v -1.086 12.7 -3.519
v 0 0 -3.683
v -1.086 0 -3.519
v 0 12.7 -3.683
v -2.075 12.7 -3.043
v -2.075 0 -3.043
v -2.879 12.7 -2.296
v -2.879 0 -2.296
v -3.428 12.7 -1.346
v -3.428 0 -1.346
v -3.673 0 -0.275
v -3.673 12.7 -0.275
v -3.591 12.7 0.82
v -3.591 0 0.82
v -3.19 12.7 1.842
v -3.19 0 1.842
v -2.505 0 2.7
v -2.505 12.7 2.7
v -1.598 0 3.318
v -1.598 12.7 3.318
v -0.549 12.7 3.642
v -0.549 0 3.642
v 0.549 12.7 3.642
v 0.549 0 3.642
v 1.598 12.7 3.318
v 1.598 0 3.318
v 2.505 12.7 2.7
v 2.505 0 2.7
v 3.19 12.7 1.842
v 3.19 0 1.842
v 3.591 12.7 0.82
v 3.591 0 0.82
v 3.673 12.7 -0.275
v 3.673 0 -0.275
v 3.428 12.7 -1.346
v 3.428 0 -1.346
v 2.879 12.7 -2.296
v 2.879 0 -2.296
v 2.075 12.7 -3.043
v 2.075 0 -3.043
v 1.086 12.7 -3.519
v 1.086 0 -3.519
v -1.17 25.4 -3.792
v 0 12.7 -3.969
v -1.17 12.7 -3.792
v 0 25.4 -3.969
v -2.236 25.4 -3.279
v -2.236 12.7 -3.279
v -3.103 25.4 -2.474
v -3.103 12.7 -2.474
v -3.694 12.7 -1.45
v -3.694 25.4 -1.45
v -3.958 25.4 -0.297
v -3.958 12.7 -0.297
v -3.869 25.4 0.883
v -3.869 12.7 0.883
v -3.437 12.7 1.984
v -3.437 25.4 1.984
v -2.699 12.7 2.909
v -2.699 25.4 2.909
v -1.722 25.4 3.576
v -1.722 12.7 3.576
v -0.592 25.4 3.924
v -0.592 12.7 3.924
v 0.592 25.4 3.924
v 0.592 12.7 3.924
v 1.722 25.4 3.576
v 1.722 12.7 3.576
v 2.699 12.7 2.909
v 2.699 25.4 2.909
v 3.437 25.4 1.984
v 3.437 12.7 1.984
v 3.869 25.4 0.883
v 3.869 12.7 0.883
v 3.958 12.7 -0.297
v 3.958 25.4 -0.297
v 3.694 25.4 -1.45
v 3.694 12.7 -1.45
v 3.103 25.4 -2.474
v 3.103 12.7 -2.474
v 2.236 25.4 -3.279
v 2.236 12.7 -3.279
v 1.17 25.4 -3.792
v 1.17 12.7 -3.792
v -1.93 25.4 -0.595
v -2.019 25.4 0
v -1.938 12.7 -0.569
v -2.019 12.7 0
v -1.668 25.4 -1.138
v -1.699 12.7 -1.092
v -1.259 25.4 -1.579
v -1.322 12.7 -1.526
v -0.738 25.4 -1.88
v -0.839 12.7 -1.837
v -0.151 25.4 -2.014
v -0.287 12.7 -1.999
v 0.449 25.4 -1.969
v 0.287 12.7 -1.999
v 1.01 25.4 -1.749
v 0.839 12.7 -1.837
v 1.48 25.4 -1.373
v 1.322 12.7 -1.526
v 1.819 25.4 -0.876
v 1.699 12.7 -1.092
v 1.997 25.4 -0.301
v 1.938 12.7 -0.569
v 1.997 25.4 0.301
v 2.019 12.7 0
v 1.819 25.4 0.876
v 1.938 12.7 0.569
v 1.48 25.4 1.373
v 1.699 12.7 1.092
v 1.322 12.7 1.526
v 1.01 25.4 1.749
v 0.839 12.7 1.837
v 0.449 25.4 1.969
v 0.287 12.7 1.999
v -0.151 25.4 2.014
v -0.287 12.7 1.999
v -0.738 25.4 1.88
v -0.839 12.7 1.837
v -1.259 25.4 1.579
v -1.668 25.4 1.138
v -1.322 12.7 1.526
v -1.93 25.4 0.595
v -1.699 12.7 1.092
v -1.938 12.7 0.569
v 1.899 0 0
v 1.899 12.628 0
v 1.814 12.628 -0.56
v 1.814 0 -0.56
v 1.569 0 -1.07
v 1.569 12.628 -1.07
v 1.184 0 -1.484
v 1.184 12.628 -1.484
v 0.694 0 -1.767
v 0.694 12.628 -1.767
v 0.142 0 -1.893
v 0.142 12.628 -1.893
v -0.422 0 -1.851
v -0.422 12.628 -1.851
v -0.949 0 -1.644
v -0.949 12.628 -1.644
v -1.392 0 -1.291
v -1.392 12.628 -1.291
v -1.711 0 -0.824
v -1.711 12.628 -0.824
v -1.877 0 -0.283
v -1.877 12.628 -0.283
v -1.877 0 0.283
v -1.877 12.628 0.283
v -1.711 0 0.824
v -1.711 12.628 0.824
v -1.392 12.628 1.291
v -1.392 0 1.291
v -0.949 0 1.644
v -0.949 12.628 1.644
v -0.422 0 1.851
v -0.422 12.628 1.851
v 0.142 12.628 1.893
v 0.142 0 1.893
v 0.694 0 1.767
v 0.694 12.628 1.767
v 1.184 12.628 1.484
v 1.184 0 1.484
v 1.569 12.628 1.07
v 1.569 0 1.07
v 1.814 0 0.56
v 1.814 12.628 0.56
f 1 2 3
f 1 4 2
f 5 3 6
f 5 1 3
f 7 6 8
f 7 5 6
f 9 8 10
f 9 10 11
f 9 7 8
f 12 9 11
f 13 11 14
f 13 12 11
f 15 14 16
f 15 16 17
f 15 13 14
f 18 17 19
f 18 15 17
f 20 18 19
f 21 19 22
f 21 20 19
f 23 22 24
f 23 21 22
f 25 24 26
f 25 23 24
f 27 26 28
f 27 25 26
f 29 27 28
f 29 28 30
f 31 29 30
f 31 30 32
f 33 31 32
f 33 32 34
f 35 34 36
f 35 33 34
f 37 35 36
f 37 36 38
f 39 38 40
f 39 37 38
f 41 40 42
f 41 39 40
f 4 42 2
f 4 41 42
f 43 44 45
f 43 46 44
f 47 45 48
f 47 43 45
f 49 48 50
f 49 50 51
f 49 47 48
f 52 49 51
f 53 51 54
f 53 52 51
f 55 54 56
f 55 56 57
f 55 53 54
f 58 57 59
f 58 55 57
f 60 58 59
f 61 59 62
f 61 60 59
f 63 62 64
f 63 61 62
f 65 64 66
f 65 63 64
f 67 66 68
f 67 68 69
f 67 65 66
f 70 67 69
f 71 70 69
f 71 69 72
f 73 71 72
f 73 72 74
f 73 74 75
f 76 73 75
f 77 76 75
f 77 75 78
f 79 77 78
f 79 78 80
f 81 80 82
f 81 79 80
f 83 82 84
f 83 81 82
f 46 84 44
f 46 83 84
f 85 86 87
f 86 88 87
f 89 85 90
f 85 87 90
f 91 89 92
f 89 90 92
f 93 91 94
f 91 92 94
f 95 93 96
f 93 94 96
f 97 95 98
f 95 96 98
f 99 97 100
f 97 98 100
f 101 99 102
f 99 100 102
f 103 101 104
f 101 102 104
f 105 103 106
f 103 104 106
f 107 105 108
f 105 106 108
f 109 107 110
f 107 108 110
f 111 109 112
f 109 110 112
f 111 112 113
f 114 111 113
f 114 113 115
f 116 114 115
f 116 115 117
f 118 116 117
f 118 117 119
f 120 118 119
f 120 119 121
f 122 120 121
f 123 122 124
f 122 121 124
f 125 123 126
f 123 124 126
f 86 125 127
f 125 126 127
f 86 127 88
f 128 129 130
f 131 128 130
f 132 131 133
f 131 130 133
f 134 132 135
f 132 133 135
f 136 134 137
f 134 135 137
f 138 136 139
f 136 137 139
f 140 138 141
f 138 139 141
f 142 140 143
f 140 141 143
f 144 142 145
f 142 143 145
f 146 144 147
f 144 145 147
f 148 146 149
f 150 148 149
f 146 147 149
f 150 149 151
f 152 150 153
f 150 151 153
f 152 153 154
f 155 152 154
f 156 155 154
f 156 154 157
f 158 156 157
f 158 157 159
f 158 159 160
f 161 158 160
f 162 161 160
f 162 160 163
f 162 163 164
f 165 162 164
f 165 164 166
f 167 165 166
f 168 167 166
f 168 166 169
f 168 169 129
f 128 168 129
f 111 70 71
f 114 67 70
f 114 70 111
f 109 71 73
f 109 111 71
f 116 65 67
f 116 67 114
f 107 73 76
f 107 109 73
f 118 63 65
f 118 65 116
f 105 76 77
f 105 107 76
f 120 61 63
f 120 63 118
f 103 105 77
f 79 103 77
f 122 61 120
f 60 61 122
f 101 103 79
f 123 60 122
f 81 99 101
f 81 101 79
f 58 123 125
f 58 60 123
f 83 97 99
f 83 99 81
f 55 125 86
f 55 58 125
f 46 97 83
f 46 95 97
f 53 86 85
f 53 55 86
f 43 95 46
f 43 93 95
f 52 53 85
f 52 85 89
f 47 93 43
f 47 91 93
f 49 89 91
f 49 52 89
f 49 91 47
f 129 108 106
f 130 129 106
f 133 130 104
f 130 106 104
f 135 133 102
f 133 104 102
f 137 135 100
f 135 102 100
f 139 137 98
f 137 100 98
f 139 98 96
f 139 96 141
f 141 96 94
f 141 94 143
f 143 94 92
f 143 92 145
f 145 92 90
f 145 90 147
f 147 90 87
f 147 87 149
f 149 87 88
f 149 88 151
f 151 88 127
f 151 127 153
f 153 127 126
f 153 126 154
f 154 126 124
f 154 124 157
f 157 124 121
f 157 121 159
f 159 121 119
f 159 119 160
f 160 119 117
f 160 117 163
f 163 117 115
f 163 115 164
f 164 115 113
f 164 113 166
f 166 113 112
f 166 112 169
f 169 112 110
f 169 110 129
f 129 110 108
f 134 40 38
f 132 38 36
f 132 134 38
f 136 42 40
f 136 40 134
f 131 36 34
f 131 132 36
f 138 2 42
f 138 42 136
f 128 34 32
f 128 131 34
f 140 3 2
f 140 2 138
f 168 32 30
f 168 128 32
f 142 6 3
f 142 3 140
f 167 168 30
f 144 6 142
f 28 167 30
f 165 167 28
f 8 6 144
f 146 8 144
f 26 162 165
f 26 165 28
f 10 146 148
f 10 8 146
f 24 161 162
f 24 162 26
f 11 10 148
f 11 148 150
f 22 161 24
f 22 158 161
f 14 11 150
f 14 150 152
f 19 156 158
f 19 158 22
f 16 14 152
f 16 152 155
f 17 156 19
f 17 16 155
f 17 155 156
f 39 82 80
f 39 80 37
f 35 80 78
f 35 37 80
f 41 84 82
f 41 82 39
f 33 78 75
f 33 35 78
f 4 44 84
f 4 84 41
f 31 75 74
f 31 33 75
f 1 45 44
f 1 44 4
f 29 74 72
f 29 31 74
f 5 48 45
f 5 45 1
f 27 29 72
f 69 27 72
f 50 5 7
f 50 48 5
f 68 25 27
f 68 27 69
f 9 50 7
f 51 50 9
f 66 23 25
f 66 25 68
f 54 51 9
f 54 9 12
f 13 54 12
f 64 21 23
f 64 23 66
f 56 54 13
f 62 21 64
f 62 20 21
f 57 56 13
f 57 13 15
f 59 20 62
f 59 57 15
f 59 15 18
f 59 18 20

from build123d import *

# Parameters (mm, degrees)
F_10_32_TAPPED_HOLE1_D     = 4.0386
F_10_32_TAPPED_HOLE1_DEPTH = 12.7
F_10_32_TAPPED_HOLE1_TIP   = 1.213317848
F_10_24_TAPPED_HOLE1_D     = 3.7973
F_10_24_TAPPED_HOLE1_DEPTH = 15.24
F_10_24_TAPPED_HOLE1_TIP   = 1.140824014


with BuildPart() as part:
    # Sketch1 → Revolve1 (revolve)
    with BuildSketch(Plane.XY, mode=Mode.PRIVATE) as revolve1_sk:
        Polygon((0, 0), (3.683, 0), (3.683, 12.7), (3.96875, 12.7), (3.96875, 25.4), (0, 25.4), align=None)
    revolve(revolve1_sk.sketch.rotate(Axis((0, 0, 0), (0, 1, 0)), 90), axis=Axis((0, 0, 0), (0, 1, 0)))

    # #10-32 Tapped Hole1
    with Locations(Plane(origin=(0, 25.4, 0), x_dir=(1, 0, 0), z_dir=(0, 1, 0))):
        with Locations((0, 0)):
            Hole(F_10_32_TAPPED_HOLE1_D / 2, depth=F_10_32_TAPPED_HOLE1_DEPTH)
            with Locations((0, 0, -(F_10_32_TAPPED_HOLE1_DEPTH + F_10_32_TAPPED_HOLE1_TIP / 2))):  # 118° drill point
                Cone(0, F_10_32_TAPPED_HOLE1_D / 2, F_10_32_TAPPED_HOLE1_TIP, mode=Mode.SUBTRACT)

    # #10-24 Tapped Hole1
    with Locations(Plane(origin=(0, 0, 0), x_dir=(-1, 0, 0), z_dir=(0, -1, 0))):
        with Locations((0, 0)):
            Hole(F_10_24_TAPPED_HOLE1_D / 2, depth=F_10_24_TAPPED_HOLE1_DEPTH)
            with Locations((0, 0, -(F_10_24_TAPPED_HOLE1_DEPTH + F_10_24_TAPPED_HOLE1_TIP / 2))):  # 118° drill point
                Cone(0, F_10_24_TAPPED_HOLE1_D / 2, F_10_24_TAPPED_HOLE1_TIP, mode=Mode.SUBTRACT)


solid = part.part
